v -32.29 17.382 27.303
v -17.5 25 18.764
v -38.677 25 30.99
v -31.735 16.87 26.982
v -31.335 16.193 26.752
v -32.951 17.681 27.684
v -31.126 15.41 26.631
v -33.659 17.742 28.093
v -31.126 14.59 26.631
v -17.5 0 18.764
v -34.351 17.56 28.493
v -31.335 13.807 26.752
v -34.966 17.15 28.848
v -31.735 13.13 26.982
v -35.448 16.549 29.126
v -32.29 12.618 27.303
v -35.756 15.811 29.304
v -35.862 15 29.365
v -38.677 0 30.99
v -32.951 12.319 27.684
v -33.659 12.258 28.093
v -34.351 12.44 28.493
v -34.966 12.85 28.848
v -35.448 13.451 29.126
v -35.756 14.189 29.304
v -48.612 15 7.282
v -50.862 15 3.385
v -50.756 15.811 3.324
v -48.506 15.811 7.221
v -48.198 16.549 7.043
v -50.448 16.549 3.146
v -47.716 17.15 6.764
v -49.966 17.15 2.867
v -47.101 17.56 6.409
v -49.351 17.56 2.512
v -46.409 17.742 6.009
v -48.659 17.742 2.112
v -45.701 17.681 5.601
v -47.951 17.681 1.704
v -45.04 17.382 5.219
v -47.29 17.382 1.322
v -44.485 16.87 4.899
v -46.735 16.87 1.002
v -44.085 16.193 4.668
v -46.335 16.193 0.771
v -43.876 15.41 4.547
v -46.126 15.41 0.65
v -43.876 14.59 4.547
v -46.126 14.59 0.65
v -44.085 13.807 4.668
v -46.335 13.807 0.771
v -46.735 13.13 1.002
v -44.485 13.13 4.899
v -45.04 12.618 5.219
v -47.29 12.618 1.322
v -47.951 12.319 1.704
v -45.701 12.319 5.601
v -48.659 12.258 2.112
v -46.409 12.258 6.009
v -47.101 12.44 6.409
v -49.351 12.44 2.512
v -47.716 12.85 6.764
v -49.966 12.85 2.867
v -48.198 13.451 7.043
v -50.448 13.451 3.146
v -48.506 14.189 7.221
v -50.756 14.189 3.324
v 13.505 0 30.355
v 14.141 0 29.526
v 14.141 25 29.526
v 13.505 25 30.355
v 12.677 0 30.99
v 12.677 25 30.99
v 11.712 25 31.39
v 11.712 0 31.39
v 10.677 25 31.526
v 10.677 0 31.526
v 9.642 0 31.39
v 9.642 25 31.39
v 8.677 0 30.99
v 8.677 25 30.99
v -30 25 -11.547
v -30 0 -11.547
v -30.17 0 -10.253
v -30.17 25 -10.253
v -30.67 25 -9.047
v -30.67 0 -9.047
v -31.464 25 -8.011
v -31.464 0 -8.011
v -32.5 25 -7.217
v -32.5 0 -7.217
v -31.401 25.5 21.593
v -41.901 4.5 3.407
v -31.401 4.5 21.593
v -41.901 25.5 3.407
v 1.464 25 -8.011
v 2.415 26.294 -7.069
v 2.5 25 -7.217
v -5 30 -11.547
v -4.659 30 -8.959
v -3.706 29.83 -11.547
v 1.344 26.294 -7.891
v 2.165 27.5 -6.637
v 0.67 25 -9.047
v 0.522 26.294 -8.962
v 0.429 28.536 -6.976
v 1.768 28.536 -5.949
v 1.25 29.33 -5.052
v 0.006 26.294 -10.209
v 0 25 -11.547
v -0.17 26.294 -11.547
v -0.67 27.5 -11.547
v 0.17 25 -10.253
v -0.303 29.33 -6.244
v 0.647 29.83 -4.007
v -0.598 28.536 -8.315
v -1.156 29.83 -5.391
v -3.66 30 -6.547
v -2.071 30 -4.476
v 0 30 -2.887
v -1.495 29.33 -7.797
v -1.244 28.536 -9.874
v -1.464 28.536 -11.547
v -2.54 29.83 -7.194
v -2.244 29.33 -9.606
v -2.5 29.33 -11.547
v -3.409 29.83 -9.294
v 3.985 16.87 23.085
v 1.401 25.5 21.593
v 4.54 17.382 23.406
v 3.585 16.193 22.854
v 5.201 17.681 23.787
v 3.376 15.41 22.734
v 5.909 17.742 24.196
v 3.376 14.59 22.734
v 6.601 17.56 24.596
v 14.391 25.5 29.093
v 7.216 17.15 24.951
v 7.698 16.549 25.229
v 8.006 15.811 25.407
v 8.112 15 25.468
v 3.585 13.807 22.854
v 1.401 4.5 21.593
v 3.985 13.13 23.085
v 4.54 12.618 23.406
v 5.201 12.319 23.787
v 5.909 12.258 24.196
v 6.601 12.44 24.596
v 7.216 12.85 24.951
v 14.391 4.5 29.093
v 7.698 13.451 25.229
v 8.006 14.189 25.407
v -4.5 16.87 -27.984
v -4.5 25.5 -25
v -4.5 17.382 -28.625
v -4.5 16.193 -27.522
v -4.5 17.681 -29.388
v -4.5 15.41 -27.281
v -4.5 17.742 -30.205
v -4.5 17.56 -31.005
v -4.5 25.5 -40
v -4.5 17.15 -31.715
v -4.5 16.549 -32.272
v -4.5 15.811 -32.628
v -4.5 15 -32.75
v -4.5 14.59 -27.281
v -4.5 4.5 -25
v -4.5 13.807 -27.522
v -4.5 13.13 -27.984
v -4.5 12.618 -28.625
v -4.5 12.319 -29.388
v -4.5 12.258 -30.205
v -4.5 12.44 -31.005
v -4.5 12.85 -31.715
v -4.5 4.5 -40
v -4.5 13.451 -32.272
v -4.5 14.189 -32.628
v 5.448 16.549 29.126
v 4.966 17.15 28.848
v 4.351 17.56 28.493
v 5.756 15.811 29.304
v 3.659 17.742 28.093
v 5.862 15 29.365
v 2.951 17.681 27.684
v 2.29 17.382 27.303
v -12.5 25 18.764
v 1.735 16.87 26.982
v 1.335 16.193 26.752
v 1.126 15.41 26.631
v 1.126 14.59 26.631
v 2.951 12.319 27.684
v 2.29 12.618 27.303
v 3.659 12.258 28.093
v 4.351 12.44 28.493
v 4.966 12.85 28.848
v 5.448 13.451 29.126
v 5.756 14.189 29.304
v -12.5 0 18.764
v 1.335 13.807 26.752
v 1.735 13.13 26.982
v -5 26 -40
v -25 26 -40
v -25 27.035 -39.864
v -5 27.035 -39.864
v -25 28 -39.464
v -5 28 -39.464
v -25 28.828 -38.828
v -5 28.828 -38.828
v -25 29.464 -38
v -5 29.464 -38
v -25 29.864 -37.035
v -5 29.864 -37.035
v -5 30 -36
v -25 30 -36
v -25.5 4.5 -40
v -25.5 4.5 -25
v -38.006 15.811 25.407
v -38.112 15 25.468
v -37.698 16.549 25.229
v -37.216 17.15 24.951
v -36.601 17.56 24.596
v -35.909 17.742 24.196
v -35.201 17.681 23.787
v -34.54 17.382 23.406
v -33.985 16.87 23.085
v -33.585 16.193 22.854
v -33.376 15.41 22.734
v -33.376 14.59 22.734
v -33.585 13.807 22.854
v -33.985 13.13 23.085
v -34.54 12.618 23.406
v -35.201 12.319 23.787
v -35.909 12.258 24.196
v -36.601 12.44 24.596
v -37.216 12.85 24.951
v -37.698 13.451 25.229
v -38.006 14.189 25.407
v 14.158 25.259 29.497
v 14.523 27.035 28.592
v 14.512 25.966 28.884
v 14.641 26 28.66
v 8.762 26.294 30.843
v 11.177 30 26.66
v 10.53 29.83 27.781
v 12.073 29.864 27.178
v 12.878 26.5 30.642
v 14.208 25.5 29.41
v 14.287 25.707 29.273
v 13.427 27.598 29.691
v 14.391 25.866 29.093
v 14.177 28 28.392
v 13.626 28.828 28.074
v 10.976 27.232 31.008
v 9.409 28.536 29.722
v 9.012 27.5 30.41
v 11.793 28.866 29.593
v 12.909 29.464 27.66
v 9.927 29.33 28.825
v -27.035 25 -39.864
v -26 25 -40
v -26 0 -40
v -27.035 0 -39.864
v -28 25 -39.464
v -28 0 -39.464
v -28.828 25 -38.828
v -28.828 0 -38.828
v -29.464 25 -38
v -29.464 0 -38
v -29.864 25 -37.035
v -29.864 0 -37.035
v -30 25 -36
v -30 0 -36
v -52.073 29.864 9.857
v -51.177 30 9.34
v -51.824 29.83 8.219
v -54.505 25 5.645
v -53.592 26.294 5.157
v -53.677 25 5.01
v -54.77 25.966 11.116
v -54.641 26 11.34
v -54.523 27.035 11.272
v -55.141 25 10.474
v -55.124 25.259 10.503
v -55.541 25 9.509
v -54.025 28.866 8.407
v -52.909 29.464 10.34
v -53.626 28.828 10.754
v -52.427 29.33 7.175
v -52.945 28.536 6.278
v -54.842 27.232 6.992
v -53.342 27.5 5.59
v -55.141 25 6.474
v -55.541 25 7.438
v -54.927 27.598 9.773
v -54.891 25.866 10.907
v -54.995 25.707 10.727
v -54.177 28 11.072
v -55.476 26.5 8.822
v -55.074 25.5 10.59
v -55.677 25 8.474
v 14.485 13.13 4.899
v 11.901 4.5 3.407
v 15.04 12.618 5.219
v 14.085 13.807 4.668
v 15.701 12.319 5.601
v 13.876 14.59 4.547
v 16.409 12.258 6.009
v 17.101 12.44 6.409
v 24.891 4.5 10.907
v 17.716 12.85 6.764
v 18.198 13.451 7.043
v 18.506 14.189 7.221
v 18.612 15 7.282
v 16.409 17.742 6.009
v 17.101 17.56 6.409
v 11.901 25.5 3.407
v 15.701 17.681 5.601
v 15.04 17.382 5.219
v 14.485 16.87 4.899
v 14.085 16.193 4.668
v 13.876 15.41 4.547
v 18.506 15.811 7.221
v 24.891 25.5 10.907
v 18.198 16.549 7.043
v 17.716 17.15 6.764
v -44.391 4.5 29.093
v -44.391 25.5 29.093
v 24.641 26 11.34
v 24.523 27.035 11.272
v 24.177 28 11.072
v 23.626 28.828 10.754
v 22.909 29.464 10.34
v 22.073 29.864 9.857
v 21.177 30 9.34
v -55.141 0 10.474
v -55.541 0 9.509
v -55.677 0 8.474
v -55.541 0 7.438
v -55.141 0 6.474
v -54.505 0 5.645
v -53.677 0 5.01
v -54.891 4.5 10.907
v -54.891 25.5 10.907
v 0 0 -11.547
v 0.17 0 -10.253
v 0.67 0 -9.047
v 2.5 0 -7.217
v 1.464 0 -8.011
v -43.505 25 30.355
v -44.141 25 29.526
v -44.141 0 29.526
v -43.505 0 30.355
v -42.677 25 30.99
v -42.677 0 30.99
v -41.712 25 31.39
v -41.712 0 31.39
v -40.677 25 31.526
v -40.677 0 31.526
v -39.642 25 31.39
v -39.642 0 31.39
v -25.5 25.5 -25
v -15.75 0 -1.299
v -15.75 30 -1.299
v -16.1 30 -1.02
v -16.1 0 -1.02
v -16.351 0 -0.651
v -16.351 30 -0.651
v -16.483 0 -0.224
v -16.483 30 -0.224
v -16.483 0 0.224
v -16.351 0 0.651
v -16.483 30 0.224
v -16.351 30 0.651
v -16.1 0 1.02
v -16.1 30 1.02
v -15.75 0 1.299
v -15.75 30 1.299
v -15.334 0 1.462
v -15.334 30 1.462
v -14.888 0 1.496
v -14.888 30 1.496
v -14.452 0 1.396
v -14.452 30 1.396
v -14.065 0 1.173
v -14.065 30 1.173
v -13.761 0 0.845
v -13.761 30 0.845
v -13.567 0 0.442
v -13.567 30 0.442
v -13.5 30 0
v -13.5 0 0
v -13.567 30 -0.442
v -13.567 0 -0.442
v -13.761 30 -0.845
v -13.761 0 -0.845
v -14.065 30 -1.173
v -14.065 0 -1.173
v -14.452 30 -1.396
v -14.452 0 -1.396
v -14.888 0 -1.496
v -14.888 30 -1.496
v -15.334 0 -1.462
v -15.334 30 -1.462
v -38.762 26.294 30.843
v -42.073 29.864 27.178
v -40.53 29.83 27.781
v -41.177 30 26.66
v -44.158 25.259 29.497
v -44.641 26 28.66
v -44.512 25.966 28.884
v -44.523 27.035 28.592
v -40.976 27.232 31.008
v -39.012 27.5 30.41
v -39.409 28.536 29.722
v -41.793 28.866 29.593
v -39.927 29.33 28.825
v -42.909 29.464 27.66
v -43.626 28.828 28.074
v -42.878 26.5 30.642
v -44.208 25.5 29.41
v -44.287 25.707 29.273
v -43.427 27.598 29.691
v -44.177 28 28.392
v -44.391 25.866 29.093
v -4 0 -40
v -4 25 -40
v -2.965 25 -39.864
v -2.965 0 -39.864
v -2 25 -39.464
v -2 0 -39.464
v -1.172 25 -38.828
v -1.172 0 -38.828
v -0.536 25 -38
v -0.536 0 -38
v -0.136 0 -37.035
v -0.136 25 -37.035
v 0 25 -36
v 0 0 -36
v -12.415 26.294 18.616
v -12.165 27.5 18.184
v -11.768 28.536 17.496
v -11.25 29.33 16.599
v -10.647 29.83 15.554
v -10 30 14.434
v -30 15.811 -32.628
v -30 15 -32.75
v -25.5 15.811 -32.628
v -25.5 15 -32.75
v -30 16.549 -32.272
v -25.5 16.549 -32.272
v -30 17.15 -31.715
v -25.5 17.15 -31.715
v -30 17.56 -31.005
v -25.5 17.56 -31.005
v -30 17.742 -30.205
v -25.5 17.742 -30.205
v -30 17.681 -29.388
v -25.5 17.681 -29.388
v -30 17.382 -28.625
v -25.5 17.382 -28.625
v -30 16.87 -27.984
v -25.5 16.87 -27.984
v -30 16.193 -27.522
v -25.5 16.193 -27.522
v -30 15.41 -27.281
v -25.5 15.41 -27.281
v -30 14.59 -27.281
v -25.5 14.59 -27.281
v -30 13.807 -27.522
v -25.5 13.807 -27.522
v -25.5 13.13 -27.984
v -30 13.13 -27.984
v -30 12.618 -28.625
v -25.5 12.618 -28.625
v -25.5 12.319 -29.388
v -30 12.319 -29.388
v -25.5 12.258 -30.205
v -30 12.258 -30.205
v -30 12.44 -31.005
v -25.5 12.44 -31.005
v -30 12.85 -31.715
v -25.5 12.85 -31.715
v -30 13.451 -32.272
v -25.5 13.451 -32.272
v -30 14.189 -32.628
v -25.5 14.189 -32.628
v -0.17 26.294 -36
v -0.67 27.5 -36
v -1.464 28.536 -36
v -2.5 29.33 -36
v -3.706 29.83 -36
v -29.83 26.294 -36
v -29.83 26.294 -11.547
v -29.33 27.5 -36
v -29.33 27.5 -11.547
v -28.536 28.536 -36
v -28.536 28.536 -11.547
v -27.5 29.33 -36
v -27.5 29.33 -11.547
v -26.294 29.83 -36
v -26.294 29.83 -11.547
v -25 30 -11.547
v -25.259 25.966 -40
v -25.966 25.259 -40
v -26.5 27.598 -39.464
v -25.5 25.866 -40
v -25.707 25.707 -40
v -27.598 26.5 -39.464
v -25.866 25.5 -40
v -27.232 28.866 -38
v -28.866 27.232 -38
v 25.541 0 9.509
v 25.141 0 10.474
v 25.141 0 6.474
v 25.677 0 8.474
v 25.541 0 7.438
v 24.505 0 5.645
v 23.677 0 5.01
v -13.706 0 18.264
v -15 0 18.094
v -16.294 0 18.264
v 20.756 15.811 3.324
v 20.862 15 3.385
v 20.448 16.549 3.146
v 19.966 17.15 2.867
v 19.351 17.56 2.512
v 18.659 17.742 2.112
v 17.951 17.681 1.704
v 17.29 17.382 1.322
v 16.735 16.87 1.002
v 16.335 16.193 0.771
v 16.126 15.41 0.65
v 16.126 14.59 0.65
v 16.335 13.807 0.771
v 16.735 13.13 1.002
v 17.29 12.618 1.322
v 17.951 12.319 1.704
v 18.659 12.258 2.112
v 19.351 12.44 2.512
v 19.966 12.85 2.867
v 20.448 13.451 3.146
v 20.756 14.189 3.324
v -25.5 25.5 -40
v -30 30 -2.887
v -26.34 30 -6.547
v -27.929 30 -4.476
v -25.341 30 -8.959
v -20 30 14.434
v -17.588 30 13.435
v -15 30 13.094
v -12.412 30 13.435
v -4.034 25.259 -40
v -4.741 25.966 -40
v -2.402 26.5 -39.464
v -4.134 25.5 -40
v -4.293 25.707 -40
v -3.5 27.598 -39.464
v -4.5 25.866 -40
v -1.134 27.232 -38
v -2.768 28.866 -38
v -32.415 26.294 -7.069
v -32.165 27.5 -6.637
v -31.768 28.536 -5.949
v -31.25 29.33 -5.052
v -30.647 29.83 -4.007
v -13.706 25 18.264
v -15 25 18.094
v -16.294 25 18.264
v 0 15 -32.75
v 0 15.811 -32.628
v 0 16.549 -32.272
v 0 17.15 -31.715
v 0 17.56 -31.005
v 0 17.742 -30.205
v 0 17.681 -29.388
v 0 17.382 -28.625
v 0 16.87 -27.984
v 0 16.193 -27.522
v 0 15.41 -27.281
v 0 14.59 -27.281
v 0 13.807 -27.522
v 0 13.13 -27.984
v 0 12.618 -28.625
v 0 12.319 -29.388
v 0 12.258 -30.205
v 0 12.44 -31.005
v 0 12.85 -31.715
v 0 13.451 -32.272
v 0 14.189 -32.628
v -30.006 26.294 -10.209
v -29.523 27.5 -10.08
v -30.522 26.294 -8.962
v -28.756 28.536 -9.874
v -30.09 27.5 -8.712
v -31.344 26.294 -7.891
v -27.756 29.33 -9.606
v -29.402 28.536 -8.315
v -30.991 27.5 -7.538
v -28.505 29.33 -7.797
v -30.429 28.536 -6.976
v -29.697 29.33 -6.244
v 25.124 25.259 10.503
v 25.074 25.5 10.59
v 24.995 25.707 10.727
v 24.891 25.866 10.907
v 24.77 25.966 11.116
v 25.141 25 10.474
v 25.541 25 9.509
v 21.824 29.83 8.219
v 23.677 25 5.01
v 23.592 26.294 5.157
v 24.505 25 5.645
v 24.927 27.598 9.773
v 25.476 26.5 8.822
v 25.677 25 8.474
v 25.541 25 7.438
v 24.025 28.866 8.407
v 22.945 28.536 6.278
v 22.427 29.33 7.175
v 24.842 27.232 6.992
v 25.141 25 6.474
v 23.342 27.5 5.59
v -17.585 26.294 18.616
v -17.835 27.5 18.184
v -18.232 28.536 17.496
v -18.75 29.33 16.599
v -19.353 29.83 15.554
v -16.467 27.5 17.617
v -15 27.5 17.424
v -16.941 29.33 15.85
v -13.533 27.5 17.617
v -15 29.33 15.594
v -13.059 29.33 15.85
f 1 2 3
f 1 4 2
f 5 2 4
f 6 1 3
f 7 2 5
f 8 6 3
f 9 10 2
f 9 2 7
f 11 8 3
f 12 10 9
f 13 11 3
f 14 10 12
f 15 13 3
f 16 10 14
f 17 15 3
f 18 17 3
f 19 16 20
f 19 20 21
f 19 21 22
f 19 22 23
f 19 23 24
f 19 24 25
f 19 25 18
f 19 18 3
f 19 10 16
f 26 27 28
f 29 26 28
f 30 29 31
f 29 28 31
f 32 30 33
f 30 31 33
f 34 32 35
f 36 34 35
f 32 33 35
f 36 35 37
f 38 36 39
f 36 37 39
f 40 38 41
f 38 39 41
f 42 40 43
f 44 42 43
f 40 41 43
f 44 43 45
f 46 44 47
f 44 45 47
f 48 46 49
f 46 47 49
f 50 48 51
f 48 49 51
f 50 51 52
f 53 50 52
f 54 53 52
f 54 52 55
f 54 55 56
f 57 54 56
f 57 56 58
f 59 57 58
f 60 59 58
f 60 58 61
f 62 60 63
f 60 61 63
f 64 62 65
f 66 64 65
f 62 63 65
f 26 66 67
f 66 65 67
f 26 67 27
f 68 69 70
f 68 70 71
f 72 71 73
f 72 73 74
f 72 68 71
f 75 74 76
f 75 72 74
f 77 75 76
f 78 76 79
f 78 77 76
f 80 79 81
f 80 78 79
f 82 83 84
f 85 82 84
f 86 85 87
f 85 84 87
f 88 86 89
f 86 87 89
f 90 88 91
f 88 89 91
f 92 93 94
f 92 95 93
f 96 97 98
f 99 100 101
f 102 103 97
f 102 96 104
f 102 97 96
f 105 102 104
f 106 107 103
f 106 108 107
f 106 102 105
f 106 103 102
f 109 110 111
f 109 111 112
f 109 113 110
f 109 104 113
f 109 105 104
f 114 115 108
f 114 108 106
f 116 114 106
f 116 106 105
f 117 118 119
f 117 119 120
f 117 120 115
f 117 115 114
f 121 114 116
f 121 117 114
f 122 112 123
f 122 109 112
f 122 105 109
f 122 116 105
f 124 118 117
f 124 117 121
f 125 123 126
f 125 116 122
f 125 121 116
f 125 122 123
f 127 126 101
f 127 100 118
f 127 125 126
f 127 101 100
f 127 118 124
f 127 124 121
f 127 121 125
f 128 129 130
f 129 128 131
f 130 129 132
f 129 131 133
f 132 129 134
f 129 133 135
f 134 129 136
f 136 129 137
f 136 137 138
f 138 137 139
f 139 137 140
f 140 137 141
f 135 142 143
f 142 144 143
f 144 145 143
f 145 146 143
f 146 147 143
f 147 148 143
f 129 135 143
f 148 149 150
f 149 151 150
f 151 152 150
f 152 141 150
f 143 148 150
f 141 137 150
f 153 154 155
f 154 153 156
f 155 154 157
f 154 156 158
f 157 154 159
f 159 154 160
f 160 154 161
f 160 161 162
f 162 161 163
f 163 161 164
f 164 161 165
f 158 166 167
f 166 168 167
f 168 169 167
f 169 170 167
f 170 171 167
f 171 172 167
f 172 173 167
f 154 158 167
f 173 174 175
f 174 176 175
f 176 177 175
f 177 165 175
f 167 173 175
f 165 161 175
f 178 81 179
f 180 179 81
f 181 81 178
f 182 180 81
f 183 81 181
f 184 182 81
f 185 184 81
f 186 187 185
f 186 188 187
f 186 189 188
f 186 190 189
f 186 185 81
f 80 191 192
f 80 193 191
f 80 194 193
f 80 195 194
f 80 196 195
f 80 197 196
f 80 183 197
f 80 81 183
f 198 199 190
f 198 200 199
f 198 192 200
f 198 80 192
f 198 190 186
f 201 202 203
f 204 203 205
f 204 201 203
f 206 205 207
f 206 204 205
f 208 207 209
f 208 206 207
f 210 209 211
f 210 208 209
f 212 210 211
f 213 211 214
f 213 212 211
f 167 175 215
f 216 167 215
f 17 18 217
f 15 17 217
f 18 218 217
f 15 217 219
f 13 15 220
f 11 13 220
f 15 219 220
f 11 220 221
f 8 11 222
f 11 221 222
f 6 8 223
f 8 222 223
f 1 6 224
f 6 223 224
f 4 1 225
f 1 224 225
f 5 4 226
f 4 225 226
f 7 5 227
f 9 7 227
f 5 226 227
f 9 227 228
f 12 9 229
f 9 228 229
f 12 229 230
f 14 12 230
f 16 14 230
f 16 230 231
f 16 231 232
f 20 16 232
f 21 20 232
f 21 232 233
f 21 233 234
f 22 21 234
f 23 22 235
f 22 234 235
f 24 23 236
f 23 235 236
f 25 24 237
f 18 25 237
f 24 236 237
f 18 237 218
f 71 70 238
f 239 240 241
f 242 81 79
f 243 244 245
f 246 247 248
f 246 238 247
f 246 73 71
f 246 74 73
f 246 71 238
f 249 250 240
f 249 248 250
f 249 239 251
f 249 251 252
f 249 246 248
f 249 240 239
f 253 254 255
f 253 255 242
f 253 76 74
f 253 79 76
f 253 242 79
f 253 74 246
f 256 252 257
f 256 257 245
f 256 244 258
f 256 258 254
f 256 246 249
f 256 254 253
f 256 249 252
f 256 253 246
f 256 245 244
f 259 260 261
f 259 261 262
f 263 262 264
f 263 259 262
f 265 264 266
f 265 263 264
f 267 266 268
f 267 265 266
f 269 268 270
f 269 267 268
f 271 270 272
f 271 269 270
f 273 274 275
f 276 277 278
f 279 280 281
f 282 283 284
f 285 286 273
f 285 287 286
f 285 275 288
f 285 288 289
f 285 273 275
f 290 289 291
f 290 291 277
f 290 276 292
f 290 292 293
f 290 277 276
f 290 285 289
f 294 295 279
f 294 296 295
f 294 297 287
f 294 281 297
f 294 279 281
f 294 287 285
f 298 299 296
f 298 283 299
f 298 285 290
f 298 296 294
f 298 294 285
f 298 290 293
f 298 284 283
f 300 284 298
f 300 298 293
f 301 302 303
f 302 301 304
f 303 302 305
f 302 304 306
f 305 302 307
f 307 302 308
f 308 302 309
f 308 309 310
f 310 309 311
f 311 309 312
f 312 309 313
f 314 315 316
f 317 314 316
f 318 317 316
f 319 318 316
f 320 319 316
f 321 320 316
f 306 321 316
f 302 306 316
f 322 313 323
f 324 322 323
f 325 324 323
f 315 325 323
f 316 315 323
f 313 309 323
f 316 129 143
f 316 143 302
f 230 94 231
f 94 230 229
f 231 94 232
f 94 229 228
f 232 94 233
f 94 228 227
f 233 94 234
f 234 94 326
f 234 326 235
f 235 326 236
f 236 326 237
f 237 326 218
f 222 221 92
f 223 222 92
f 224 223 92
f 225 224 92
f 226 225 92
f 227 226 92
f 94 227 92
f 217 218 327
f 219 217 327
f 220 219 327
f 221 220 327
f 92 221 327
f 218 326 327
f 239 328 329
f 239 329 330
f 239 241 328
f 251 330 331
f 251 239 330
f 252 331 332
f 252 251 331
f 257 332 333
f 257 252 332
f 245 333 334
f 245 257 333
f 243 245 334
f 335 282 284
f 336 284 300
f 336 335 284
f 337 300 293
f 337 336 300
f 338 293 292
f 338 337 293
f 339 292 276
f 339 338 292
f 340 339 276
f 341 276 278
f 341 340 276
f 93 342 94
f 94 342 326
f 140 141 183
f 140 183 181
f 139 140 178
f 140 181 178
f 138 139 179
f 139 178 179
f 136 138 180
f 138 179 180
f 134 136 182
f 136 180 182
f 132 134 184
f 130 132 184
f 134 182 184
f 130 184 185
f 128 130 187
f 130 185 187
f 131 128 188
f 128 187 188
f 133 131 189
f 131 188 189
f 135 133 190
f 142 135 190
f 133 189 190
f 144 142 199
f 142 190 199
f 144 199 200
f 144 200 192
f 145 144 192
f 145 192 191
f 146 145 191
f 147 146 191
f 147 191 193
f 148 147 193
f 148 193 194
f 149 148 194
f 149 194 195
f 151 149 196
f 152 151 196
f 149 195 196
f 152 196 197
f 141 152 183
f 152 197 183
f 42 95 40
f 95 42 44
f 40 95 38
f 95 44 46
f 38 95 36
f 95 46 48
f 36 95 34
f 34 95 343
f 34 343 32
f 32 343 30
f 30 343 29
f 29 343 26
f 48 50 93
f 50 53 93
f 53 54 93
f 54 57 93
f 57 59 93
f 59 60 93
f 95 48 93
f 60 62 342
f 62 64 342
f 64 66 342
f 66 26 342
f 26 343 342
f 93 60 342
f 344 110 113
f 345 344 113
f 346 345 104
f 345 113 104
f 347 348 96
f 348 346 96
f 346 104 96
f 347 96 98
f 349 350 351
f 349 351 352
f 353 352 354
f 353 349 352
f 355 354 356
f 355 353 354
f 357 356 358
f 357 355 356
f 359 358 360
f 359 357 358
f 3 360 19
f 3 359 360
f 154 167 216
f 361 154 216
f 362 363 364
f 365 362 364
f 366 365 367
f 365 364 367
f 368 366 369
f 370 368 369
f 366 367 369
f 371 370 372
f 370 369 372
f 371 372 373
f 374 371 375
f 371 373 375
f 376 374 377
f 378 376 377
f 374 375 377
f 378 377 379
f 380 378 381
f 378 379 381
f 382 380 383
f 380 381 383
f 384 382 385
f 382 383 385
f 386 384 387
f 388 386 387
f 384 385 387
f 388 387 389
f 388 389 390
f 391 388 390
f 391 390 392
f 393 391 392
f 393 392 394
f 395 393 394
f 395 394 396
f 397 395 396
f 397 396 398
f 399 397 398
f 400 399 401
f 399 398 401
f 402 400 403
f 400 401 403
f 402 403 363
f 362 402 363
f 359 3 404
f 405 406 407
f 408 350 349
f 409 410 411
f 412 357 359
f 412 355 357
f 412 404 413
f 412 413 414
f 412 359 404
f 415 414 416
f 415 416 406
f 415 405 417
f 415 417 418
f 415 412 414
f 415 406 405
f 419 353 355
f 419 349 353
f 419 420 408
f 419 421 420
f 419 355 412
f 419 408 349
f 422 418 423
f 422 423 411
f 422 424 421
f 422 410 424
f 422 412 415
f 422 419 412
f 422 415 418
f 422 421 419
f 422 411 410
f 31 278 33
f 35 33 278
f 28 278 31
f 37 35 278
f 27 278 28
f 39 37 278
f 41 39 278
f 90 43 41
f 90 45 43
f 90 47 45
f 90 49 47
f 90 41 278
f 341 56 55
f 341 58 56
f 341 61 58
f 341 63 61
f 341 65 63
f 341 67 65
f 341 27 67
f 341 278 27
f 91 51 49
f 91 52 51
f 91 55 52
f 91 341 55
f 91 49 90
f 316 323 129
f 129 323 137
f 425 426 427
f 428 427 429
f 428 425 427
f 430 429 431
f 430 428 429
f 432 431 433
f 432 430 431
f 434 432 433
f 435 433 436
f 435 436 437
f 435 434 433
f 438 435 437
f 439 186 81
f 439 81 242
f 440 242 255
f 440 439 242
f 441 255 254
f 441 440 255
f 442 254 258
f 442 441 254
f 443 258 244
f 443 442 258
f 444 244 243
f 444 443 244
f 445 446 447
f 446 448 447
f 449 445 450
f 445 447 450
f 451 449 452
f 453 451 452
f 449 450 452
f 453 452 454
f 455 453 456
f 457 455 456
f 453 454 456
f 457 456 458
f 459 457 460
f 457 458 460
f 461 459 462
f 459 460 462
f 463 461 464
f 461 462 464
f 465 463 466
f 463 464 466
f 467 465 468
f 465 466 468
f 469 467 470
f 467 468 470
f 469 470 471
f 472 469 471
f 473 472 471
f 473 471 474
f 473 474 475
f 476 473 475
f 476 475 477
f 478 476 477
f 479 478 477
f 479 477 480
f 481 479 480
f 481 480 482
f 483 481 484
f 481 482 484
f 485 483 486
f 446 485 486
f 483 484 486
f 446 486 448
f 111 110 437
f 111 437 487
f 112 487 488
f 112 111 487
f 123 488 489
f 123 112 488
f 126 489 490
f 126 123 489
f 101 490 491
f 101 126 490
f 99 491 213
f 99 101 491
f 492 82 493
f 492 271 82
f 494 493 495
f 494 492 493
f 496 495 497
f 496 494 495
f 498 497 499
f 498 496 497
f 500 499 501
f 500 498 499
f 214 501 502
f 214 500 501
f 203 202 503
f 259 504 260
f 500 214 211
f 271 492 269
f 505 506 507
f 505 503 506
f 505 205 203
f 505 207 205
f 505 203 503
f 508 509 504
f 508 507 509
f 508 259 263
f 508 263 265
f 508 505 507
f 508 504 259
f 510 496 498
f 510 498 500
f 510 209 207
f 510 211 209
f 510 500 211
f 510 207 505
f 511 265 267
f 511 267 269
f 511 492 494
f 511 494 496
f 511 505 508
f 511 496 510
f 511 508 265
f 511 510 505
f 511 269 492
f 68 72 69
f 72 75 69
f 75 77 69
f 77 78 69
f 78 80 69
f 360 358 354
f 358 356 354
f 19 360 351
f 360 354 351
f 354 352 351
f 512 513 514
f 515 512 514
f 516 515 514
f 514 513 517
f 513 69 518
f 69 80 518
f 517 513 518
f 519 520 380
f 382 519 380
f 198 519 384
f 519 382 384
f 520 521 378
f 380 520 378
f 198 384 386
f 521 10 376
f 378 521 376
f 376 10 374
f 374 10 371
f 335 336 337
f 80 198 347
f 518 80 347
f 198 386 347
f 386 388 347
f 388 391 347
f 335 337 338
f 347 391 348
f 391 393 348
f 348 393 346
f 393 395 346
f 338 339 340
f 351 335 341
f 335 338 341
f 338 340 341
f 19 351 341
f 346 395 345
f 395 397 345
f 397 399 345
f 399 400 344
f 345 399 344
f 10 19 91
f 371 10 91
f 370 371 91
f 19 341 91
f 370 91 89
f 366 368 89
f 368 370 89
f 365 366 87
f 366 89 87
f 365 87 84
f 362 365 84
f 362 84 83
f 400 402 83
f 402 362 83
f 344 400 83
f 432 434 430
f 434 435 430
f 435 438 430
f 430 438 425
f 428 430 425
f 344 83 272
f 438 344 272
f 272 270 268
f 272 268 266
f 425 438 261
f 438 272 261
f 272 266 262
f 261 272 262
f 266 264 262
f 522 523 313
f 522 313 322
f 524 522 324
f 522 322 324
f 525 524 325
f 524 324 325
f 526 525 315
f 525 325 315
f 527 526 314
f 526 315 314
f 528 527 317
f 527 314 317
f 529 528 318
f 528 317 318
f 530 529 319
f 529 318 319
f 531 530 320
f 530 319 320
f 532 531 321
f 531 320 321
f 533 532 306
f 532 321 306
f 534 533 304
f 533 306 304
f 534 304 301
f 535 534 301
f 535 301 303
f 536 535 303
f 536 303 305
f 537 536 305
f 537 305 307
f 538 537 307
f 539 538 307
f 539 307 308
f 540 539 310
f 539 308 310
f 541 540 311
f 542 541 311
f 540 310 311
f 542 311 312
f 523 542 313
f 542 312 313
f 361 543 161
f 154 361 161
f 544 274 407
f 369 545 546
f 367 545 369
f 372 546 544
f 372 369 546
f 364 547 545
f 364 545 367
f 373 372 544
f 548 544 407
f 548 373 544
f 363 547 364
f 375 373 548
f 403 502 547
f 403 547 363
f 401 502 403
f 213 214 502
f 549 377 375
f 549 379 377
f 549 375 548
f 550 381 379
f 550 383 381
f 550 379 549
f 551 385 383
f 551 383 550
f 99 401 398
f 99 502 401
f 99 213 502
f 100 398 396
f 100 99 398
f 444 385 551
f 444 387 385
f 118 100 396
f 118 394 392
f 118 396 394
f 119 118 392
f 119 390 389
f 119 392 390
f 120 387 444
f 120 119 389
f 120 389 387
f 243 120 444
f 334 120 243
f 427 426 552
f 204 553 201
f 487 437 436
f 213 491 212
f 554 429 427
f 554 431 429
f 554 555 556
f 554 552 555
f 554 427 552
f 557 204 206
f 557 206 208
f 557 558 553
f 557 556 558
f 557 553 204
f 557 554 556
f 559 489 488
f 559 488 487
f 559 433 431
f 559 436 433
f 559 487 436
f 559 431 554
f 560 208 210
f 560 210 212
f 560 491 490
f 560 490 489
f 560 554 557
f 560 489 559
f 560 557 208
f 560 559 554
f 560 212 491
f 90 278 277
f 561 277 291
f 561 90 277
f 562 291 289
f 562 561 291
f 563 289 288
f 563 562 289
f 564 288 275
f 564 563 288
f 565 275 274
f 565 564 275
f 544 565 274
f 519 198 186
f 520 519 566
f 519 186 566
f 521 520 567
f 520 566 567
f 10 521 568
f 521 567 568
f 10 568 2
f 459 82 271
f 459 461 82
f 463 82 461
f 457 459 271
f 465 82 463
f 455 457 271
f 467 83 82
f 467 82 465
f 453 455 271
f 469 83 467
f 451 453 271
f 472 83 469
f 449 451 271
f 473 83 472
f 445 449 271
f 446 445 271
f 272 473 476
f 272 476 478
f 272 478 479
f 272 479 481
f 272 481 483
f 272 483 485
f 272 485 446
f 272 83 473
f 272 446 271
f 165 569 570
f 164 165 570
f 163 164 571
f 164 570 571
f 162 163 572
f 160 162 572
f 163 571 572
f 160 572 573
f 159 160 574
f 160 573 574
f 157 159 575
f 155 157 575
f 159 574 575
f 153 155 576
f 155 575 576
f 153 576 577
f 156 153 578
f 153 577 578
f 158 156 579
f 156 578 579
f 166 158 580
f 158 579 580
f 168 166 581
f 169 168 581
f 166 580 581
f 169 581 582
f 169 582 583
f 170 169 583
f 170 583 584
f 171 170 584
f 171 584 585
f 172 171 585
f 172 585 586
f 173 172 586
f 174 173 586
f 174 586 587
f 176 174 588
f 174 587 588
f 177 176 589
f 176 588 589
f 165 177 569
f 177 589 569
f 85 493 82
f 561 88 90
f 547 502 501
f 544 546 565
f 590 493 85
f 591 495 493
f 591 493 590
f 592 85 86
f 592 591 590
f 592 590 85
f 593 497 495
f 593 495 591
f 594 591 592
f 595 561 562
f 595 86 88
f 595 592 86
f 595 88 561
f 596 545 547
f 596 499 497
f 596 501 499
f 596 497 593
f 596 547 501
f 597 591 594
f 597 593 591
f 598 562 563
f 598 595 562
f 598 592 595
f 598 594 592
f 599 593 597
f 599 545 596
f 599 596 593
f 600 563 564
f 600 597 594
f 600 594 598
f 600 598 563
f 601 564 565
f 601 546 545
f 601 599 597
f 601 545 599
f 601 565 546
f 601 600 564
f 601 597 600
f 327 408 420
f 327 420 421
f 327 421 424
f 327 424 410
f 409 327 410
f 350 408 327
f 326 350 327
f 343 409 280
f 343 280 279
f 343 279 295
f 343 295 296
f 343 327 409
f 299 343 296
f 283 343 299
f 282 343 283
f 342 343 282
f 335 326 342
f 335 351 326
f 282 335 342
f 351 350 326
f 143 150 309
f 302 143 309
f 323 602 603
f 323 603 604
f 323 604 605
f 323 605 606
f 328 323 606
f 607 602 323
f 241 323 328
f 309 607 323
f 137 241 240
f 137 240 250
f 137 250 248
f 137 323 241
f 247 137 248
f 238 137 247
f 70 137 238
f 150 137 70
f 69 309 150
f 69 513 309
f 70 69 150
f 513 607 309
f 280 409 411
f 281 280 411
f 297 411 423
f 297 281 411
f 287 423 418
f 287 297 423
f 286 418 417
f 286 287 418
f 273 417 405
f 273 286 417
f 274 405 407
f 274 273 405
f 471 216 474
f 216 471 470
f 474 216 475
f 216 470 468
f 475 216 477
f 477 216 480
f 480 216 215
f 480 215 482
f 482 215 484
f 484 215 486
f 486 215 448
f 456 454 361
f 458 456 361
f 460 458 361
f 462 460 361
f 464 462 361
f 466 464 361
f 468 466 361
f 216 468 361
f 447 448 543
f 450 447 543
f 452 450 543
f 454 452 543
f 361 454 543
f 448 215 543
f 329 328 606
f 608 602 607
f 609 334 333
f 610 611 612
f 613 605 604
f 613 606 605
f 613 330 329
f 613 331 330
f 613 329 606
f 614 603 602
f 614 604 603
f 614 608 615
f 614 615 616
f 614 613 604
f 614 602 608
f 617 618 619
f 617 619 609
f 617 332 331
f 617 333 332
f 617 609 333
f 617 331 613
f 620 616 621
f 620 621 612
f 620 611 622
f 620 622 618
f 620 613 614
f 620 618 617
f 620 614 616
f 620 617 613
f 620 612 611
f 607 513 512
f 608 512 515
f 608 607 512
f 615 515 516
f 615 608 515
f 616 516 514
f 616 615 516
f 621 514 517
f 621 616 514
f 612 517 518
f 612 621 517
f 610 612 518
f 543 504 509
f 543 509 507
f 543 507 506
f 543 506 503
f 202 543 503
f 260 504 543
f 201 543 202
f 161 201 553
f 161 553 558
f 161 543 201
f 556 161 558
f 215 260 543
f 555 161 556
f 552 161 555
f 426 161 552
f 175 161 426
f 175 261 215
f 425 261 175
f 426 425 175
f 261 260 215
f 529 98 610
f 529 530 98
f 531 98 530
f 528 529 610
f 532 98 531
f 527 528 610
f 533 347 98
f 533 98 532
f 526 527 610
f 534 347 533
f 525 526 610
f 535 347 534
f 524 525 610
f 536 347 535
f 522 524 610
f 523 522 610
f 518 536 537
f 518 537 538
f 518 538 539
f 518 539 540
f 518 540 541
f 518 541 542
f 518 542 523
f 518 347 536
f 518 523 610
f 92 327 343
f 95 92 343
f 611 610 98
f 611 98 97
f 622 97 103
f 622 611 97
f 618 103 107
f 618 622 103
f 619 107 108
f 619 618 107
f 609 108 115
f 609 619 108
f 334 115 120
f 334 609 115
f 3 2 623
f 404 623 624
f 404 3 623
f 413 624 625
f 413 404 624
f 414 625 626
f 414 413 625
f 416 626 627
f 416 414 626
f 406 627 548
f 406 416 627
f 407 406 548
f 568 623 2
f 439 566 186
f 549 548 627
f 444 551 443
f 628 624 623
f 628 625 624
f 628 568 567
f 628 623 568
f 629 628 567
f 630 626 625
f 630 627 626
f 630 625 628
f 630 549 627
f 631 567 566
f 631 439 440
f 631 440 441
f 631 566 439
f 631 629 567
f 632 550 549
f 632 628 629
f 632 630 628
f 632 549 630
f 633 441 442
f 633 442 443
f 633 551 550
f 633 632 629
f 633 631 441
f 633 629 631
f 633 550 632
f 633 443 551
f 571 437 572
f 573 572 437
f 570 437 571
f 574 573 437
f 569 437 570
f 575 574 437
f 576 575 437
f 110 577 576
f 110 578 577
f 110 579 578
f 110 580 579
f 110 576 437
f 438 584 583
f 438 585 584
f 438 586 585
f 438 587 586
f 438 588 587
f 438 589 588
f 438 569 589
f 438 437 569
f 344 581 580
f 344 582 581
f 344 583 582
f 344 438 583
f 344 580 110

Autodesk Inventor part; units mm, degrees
ref_plane "YZ Plane" through (0, 0, 0) normal (1, 0, 0) x (0, 1, 0)
ref_plane "XZ Plane" through (0, 0, 0) normal (0, 1, 0) x (-1, 0, 0)
ref_plane "XY Plane" through (0, 0, 0) normal (0, 0, 1) x (1, 0, 0)
sketch "Sketch1" plane through (0, 0, 0) normal (0, 1, 0) x (-1, 0, 0)
  line L0 (0, 0) -> (30, 0)
  line L1 (30, 0) -> (30, -40)
  line L2 (30, -40) -> (0, -40)
  line L3 (0, -40) -> (0, 0)
  dimension "d0" = 30
  dimension "d1" = 40
extrude "Extrusion1" add sketch "Sketch1" along normal blind 30
sketch "Sketch6" plane through (0, 30, 0) normal (0, 1, 0) x (1, 0, 0)
  line L0 (0, 0) -> (-15, 0)
  line L1 (-30, 0) -> (0, 0) projected
  circle A0 centre (-15, 0) radius 1.5
  dimension "d32" = 3
extrude "Extrusion6" cut sketch "Sketch6" against normal blind 30
pattern_circular "Circular Pattern4" count 3 over 360 about axis through (-15, 30, 0) along (0, -1, 0) of "Extrusion1", "Extrusion6"
sketch "Sketch7" plane through (0, 0, -40) normal (0, 0, -1) x (-1, 0, 0)
  line L0 (4.5, 4.5) -> (25.5, 4.5)
  line L1 (25.5, 4.5) -> (25.5, 25.5)
  line L2 (25.5, 25.5) -> (4.5, 25.5)
  line L3 (4.5, 25.5) -> (4.5, 4.5)
  line L4 (15, 30) -> (15, 0) projected
  line L5 (4.5, 4.5) -> (25.5, 25.5) construction
  line L6 (25.5, 4.5) -> (4.5, 25.5) construction
  point P0 (0, 0)
  point P1 (15, 15)
  dimension "d38" = 21
  dimension "d39" = 21
extrude "Extrusion7" cut sketch "Sketch7" against normal blind 15
pattern_circular "Circular Pattern5" count 3 over 360 about axis through (-15, 30, 0) along (0, -1, 0) of "Extrusion7"
sketch "Sketch8" plane through (-15, 0, 17.3205) normal (-0.5, 0, 0.866) x (0.866, 0, 0.5)
  line L0 (31.3397, 0) -> (31.3397, 30) projected
  line L1 (31.3397, 15) -> (21.3397, 15)
  circle A0 centre (21.3397, 15) radius 2.75
  point P0 (4.3301, 0)
  dimension "d45" = 10
  dimension "d46" = 5.5
extrude "Extrusion8" cut sketch "Sketch8" against normal blind 30
pattern_circular "Circular Pattern6" count 3 over 360 about axis through (-15, 30, 0) along (0, -1, 0) of "Extrusion8"
fillet "Fillet5" radius 5 3 edges at (-15, 15, 17.3205) (0, 15, -8.6603) (-30, 15, -8.6603)
fillet "Fillet6" radius 5 6 edges at (-30, 30, -25.7735) (-44.8205, 30, -0.1036) (-0.1795, 30, 25.8771) (-29.8205, 30, 25.8771) (14.8205, 30, -0.1036) (0, 30, -25.7735)
fillet "Fillet7" radius 4 15 edges at (-28.5355, 28.5355, -40) (-30, 12.5, -40) (-1.4645, 28.5355, -40) (0, 12.5, -40) (-15, 30, -40) (-42.8732, 28.5355, 31.7221) (-42.141, 12.5, 32.9904) (-56.4088, 28.5355, 8.2779) (-57.141, 12.5, 7.0096) (-49.641, 30, 20) (26.4088, 28.5355, 8.2779) (27.141, 12.5, 7.0096) (12.8732, 28.5355, 31.7221) (12.141, 12.5, 32.9904) (19.641, 30, 20)
properties part number "80_20_top_connector"
